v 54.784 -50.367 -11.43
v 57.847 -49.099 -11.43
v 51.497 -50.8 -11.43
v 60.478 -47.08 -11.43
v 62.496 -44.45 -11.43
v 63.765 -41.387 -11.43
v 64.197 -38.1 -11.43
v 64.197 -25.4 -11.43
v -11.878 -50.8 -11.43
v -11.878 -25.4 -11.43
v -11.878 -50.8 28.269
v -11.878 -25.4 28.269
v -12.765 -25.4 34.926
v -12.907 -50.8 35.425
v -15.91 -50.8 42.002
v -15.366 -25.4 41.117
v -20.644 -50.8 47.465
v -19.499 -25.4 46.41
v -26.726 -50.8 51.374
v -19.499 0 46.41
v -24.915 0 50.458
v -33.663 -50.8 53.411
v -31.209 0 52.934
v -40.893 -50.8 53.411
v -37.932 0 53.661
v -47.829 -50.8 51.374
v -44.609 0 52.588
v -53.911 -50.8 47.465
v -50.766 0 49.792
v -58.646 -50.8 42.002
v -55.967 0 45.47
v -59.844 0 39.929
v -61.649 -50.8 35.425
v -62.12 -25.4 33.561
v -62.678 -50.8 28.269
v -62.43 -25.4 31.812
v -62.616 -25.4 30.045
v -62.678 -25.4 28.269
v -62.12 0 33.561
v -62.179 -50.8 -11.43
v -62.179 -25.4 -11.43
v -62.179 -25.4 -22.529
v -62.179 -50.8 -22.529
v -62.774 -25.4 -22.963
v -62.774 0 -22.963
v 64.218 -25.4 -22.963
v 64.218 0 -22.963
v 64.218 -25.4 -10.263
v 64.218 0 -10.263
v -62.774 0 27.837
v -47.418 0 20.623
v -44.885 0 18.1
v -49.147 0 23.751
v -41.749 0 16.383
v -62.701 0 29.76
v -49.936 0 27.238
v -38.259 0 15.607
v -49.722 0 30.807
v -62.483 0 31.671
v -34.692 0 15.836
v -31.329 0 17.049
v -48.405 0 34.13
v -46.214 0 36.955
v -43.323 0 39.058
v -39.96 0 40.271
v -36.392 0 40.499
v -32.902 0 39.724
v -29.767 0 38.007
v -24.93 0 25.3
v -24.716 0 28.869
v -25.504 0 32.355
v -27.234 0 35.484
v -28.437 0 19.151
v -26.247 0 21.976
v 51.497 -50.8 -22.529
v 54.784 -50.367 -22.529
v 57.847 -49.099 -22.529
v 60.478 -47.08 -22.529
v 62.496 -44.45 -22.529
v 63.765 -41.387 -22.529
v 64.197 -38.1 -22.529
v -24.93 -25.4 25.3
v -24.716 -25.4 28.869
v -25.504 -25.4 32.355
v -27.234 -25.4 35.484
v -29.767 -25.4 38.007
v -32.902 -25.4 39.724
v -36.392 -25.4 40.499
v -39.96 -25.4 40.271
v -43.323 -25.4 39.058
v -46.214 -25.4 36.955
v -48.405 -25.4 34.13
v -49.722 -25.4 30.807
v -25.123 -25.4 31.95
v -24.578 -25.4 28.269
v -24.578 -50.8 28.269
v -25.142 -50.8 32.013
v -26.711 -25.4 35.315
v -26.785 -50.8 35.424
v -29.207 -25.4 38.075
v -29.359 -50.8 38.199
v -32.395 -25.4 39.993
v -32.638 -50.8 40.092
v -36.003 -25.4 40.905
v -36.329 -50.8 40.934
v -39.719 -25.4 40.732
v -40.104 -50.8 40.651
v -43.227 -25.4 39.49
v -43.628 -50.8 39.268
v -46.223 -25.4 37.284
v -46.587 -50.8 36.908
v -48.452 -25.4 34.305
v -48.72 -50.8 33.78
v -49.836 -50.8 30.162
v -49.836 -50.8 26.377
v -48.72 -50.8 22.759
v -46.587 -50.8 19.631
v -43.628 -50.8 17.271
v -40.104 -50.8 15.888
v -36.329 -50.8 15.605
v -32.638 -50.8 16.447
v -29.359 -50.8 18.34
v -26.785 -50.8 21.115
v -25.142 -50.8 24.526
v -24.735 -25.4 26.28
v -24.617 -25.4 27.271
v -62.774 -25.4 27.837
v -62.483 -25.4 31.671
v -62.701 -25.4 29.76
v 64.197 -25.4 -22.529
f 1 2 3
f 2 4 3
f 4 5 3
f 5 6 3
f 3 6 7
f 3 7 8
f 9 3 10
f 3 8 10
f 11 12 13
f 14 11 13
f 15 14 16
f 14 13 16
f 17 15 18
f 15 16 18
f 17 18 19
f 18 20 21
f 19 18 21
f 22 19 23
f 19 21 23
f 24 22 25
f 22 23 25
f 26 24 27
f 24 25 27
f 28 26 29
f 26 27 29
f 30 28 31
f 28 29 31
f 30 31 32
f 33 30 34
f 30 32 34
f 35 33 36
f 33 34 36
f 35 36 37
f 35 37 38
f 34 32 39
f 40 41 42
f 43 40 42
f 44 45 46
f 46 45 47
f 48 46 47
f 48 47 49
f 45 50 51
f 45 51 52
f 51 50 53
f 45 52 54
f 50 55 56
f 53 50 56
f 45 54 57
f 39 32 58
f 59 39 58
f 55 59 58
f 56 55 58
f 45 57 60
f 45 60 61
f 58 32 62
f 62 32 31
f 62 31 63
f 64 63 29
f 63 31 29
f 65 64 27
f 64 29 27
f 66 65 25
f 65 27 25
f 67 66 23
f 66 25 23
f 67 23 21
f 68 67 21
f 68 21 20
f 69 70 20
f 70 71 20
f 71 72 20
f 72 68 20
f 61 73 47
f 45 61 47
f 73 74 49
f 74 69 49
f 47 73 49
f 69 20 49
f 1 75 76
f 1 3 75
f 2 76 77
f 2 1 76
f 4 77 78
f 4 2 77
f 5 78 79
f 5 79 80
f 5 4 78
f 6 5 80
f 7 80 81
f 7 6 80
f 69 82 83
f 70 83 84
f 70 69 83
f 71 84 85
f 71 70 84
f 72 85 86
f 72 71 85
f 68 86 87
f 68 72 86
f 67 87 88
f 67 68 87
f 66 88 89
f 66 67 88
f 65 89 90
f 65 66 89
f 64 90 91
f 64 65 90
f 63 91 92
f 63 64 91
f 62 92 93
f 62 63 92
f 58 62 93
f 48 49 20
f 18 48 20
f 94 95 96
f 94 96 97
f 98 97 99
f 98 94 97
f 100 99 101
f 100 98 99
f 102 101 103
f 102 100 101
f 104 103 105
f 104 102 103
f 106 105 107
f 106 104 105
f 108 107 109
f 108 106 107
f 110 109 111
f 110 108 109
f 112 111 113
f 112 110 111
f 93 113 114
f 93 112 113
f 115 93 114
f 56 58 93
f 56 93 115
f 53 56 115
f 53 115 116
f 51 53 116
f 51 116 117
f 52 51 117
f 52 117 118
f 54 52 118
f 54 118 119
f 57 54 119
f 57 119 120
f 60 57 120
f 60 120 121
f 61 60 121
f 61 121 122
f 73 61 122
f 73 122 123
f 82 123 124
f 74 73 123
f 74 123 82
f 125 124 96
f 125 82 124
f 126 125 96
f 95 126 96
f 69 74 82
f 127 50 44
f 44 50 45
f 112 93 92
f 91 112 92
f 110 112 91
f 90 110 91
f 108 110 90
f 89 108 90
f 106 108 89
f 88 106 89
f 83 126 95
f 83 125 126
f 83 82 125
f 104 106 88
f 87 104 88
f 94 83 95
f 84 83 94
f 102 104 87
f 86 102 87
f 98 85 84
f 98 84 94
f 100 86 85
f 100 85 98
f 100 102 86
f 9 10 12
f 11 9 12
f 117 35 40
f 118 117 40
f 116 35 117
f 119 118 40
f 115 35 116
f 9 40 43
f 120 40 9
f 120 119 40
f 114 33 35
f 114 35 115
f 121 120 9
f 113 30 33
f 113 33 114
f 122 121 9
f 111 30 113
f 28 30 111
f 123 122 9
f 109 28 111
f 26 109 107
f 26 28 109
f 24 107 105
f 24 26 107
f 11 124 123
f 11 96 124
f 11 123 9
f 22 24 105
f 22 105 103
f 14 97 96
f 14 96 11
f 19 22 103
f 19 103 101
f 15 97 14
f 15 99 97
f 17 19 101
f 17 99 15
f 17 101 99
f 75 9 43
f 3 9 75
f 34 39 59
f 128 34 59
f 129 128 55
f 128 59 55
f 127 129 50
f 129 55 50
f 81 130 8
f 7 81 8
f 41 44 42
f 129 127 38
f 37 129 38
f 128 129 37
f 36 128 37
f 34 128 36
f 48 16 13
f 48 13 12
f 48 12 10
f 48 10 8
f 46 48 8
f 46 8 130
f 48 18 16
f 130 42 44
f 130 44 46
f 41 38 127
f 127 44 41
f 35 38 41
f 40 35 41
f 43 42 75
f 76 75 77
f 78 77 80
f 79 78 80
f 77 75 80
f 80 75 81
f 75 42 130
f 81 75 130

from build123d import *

# Parameters (mm, degrees)
F0_R     = 12.7
F1_DEPTH = 25.4
F2_R     = 12.7
F3_DEPTH = 50.8
F4_R     = 12.7


with BuildPart() as f1:
    # F0 (on Front) → F1 (new body)
    with BuildSketch(Plane.XZ):
        with BuildLine():
            Line((64.218075, -10.262585), (-23.134906, 48.871121))
            ThreePointArc((-23.134906, 48.871121), (-49.279468, 50.274275), (-62.773699, 27.837415))
            Line((-62.773699, 27.837415), (-62.773699, -22.962585))
            Line((-62.773699, -22.962585), (64.218075, -22.962585))
            Line((64.218075, -22.962585), (64.218075, -10.262585))
        make_face()
        with Locations((-37.373699, 27.837415)):
            Circle(F0_R, mode=Mode.SUBTRACT)
    extrude(amount=F1_DEPTH)

    # F2 (on Front) → F3 (join)
    with BuildSketch(Plane.XZ):
        with BuildLine():
            Line((-11.877737, -11.430001), (-11.877737, 28.269436))
            ThreePointArc((-11.877737, 28.269436), (-37.277737, 53.669436), (-62.677737, 28.269436))
            Line((-62.677737, 28.269436), (-62.1792, -11.430001))
            Line((-62.1792, -11.430001), (-62.1792, -22.529295))
            Line((-62.1792, -22.529295), (64.197391, -22.529295))
            Line((64.197391, -22.529295), (64.197391, -11.430001))
            Line((64.197391, -11.430001), (-11.877737, -11.430001))
        make_face()
        with Locations((-37.277737, 28.269436)):
            Circle(F2_R, mode=Mode.SUBTRACT)
    extrude(amount=F3_DEPTH)

    # F4
    f4_edges = [f1.edges().sort_by_distance(p)[0] for p in [
        (64.197391, -50.8, -16.979648),
    ]]
    fillet(f4_edges, radius=F4_R)


solid = f1.part
